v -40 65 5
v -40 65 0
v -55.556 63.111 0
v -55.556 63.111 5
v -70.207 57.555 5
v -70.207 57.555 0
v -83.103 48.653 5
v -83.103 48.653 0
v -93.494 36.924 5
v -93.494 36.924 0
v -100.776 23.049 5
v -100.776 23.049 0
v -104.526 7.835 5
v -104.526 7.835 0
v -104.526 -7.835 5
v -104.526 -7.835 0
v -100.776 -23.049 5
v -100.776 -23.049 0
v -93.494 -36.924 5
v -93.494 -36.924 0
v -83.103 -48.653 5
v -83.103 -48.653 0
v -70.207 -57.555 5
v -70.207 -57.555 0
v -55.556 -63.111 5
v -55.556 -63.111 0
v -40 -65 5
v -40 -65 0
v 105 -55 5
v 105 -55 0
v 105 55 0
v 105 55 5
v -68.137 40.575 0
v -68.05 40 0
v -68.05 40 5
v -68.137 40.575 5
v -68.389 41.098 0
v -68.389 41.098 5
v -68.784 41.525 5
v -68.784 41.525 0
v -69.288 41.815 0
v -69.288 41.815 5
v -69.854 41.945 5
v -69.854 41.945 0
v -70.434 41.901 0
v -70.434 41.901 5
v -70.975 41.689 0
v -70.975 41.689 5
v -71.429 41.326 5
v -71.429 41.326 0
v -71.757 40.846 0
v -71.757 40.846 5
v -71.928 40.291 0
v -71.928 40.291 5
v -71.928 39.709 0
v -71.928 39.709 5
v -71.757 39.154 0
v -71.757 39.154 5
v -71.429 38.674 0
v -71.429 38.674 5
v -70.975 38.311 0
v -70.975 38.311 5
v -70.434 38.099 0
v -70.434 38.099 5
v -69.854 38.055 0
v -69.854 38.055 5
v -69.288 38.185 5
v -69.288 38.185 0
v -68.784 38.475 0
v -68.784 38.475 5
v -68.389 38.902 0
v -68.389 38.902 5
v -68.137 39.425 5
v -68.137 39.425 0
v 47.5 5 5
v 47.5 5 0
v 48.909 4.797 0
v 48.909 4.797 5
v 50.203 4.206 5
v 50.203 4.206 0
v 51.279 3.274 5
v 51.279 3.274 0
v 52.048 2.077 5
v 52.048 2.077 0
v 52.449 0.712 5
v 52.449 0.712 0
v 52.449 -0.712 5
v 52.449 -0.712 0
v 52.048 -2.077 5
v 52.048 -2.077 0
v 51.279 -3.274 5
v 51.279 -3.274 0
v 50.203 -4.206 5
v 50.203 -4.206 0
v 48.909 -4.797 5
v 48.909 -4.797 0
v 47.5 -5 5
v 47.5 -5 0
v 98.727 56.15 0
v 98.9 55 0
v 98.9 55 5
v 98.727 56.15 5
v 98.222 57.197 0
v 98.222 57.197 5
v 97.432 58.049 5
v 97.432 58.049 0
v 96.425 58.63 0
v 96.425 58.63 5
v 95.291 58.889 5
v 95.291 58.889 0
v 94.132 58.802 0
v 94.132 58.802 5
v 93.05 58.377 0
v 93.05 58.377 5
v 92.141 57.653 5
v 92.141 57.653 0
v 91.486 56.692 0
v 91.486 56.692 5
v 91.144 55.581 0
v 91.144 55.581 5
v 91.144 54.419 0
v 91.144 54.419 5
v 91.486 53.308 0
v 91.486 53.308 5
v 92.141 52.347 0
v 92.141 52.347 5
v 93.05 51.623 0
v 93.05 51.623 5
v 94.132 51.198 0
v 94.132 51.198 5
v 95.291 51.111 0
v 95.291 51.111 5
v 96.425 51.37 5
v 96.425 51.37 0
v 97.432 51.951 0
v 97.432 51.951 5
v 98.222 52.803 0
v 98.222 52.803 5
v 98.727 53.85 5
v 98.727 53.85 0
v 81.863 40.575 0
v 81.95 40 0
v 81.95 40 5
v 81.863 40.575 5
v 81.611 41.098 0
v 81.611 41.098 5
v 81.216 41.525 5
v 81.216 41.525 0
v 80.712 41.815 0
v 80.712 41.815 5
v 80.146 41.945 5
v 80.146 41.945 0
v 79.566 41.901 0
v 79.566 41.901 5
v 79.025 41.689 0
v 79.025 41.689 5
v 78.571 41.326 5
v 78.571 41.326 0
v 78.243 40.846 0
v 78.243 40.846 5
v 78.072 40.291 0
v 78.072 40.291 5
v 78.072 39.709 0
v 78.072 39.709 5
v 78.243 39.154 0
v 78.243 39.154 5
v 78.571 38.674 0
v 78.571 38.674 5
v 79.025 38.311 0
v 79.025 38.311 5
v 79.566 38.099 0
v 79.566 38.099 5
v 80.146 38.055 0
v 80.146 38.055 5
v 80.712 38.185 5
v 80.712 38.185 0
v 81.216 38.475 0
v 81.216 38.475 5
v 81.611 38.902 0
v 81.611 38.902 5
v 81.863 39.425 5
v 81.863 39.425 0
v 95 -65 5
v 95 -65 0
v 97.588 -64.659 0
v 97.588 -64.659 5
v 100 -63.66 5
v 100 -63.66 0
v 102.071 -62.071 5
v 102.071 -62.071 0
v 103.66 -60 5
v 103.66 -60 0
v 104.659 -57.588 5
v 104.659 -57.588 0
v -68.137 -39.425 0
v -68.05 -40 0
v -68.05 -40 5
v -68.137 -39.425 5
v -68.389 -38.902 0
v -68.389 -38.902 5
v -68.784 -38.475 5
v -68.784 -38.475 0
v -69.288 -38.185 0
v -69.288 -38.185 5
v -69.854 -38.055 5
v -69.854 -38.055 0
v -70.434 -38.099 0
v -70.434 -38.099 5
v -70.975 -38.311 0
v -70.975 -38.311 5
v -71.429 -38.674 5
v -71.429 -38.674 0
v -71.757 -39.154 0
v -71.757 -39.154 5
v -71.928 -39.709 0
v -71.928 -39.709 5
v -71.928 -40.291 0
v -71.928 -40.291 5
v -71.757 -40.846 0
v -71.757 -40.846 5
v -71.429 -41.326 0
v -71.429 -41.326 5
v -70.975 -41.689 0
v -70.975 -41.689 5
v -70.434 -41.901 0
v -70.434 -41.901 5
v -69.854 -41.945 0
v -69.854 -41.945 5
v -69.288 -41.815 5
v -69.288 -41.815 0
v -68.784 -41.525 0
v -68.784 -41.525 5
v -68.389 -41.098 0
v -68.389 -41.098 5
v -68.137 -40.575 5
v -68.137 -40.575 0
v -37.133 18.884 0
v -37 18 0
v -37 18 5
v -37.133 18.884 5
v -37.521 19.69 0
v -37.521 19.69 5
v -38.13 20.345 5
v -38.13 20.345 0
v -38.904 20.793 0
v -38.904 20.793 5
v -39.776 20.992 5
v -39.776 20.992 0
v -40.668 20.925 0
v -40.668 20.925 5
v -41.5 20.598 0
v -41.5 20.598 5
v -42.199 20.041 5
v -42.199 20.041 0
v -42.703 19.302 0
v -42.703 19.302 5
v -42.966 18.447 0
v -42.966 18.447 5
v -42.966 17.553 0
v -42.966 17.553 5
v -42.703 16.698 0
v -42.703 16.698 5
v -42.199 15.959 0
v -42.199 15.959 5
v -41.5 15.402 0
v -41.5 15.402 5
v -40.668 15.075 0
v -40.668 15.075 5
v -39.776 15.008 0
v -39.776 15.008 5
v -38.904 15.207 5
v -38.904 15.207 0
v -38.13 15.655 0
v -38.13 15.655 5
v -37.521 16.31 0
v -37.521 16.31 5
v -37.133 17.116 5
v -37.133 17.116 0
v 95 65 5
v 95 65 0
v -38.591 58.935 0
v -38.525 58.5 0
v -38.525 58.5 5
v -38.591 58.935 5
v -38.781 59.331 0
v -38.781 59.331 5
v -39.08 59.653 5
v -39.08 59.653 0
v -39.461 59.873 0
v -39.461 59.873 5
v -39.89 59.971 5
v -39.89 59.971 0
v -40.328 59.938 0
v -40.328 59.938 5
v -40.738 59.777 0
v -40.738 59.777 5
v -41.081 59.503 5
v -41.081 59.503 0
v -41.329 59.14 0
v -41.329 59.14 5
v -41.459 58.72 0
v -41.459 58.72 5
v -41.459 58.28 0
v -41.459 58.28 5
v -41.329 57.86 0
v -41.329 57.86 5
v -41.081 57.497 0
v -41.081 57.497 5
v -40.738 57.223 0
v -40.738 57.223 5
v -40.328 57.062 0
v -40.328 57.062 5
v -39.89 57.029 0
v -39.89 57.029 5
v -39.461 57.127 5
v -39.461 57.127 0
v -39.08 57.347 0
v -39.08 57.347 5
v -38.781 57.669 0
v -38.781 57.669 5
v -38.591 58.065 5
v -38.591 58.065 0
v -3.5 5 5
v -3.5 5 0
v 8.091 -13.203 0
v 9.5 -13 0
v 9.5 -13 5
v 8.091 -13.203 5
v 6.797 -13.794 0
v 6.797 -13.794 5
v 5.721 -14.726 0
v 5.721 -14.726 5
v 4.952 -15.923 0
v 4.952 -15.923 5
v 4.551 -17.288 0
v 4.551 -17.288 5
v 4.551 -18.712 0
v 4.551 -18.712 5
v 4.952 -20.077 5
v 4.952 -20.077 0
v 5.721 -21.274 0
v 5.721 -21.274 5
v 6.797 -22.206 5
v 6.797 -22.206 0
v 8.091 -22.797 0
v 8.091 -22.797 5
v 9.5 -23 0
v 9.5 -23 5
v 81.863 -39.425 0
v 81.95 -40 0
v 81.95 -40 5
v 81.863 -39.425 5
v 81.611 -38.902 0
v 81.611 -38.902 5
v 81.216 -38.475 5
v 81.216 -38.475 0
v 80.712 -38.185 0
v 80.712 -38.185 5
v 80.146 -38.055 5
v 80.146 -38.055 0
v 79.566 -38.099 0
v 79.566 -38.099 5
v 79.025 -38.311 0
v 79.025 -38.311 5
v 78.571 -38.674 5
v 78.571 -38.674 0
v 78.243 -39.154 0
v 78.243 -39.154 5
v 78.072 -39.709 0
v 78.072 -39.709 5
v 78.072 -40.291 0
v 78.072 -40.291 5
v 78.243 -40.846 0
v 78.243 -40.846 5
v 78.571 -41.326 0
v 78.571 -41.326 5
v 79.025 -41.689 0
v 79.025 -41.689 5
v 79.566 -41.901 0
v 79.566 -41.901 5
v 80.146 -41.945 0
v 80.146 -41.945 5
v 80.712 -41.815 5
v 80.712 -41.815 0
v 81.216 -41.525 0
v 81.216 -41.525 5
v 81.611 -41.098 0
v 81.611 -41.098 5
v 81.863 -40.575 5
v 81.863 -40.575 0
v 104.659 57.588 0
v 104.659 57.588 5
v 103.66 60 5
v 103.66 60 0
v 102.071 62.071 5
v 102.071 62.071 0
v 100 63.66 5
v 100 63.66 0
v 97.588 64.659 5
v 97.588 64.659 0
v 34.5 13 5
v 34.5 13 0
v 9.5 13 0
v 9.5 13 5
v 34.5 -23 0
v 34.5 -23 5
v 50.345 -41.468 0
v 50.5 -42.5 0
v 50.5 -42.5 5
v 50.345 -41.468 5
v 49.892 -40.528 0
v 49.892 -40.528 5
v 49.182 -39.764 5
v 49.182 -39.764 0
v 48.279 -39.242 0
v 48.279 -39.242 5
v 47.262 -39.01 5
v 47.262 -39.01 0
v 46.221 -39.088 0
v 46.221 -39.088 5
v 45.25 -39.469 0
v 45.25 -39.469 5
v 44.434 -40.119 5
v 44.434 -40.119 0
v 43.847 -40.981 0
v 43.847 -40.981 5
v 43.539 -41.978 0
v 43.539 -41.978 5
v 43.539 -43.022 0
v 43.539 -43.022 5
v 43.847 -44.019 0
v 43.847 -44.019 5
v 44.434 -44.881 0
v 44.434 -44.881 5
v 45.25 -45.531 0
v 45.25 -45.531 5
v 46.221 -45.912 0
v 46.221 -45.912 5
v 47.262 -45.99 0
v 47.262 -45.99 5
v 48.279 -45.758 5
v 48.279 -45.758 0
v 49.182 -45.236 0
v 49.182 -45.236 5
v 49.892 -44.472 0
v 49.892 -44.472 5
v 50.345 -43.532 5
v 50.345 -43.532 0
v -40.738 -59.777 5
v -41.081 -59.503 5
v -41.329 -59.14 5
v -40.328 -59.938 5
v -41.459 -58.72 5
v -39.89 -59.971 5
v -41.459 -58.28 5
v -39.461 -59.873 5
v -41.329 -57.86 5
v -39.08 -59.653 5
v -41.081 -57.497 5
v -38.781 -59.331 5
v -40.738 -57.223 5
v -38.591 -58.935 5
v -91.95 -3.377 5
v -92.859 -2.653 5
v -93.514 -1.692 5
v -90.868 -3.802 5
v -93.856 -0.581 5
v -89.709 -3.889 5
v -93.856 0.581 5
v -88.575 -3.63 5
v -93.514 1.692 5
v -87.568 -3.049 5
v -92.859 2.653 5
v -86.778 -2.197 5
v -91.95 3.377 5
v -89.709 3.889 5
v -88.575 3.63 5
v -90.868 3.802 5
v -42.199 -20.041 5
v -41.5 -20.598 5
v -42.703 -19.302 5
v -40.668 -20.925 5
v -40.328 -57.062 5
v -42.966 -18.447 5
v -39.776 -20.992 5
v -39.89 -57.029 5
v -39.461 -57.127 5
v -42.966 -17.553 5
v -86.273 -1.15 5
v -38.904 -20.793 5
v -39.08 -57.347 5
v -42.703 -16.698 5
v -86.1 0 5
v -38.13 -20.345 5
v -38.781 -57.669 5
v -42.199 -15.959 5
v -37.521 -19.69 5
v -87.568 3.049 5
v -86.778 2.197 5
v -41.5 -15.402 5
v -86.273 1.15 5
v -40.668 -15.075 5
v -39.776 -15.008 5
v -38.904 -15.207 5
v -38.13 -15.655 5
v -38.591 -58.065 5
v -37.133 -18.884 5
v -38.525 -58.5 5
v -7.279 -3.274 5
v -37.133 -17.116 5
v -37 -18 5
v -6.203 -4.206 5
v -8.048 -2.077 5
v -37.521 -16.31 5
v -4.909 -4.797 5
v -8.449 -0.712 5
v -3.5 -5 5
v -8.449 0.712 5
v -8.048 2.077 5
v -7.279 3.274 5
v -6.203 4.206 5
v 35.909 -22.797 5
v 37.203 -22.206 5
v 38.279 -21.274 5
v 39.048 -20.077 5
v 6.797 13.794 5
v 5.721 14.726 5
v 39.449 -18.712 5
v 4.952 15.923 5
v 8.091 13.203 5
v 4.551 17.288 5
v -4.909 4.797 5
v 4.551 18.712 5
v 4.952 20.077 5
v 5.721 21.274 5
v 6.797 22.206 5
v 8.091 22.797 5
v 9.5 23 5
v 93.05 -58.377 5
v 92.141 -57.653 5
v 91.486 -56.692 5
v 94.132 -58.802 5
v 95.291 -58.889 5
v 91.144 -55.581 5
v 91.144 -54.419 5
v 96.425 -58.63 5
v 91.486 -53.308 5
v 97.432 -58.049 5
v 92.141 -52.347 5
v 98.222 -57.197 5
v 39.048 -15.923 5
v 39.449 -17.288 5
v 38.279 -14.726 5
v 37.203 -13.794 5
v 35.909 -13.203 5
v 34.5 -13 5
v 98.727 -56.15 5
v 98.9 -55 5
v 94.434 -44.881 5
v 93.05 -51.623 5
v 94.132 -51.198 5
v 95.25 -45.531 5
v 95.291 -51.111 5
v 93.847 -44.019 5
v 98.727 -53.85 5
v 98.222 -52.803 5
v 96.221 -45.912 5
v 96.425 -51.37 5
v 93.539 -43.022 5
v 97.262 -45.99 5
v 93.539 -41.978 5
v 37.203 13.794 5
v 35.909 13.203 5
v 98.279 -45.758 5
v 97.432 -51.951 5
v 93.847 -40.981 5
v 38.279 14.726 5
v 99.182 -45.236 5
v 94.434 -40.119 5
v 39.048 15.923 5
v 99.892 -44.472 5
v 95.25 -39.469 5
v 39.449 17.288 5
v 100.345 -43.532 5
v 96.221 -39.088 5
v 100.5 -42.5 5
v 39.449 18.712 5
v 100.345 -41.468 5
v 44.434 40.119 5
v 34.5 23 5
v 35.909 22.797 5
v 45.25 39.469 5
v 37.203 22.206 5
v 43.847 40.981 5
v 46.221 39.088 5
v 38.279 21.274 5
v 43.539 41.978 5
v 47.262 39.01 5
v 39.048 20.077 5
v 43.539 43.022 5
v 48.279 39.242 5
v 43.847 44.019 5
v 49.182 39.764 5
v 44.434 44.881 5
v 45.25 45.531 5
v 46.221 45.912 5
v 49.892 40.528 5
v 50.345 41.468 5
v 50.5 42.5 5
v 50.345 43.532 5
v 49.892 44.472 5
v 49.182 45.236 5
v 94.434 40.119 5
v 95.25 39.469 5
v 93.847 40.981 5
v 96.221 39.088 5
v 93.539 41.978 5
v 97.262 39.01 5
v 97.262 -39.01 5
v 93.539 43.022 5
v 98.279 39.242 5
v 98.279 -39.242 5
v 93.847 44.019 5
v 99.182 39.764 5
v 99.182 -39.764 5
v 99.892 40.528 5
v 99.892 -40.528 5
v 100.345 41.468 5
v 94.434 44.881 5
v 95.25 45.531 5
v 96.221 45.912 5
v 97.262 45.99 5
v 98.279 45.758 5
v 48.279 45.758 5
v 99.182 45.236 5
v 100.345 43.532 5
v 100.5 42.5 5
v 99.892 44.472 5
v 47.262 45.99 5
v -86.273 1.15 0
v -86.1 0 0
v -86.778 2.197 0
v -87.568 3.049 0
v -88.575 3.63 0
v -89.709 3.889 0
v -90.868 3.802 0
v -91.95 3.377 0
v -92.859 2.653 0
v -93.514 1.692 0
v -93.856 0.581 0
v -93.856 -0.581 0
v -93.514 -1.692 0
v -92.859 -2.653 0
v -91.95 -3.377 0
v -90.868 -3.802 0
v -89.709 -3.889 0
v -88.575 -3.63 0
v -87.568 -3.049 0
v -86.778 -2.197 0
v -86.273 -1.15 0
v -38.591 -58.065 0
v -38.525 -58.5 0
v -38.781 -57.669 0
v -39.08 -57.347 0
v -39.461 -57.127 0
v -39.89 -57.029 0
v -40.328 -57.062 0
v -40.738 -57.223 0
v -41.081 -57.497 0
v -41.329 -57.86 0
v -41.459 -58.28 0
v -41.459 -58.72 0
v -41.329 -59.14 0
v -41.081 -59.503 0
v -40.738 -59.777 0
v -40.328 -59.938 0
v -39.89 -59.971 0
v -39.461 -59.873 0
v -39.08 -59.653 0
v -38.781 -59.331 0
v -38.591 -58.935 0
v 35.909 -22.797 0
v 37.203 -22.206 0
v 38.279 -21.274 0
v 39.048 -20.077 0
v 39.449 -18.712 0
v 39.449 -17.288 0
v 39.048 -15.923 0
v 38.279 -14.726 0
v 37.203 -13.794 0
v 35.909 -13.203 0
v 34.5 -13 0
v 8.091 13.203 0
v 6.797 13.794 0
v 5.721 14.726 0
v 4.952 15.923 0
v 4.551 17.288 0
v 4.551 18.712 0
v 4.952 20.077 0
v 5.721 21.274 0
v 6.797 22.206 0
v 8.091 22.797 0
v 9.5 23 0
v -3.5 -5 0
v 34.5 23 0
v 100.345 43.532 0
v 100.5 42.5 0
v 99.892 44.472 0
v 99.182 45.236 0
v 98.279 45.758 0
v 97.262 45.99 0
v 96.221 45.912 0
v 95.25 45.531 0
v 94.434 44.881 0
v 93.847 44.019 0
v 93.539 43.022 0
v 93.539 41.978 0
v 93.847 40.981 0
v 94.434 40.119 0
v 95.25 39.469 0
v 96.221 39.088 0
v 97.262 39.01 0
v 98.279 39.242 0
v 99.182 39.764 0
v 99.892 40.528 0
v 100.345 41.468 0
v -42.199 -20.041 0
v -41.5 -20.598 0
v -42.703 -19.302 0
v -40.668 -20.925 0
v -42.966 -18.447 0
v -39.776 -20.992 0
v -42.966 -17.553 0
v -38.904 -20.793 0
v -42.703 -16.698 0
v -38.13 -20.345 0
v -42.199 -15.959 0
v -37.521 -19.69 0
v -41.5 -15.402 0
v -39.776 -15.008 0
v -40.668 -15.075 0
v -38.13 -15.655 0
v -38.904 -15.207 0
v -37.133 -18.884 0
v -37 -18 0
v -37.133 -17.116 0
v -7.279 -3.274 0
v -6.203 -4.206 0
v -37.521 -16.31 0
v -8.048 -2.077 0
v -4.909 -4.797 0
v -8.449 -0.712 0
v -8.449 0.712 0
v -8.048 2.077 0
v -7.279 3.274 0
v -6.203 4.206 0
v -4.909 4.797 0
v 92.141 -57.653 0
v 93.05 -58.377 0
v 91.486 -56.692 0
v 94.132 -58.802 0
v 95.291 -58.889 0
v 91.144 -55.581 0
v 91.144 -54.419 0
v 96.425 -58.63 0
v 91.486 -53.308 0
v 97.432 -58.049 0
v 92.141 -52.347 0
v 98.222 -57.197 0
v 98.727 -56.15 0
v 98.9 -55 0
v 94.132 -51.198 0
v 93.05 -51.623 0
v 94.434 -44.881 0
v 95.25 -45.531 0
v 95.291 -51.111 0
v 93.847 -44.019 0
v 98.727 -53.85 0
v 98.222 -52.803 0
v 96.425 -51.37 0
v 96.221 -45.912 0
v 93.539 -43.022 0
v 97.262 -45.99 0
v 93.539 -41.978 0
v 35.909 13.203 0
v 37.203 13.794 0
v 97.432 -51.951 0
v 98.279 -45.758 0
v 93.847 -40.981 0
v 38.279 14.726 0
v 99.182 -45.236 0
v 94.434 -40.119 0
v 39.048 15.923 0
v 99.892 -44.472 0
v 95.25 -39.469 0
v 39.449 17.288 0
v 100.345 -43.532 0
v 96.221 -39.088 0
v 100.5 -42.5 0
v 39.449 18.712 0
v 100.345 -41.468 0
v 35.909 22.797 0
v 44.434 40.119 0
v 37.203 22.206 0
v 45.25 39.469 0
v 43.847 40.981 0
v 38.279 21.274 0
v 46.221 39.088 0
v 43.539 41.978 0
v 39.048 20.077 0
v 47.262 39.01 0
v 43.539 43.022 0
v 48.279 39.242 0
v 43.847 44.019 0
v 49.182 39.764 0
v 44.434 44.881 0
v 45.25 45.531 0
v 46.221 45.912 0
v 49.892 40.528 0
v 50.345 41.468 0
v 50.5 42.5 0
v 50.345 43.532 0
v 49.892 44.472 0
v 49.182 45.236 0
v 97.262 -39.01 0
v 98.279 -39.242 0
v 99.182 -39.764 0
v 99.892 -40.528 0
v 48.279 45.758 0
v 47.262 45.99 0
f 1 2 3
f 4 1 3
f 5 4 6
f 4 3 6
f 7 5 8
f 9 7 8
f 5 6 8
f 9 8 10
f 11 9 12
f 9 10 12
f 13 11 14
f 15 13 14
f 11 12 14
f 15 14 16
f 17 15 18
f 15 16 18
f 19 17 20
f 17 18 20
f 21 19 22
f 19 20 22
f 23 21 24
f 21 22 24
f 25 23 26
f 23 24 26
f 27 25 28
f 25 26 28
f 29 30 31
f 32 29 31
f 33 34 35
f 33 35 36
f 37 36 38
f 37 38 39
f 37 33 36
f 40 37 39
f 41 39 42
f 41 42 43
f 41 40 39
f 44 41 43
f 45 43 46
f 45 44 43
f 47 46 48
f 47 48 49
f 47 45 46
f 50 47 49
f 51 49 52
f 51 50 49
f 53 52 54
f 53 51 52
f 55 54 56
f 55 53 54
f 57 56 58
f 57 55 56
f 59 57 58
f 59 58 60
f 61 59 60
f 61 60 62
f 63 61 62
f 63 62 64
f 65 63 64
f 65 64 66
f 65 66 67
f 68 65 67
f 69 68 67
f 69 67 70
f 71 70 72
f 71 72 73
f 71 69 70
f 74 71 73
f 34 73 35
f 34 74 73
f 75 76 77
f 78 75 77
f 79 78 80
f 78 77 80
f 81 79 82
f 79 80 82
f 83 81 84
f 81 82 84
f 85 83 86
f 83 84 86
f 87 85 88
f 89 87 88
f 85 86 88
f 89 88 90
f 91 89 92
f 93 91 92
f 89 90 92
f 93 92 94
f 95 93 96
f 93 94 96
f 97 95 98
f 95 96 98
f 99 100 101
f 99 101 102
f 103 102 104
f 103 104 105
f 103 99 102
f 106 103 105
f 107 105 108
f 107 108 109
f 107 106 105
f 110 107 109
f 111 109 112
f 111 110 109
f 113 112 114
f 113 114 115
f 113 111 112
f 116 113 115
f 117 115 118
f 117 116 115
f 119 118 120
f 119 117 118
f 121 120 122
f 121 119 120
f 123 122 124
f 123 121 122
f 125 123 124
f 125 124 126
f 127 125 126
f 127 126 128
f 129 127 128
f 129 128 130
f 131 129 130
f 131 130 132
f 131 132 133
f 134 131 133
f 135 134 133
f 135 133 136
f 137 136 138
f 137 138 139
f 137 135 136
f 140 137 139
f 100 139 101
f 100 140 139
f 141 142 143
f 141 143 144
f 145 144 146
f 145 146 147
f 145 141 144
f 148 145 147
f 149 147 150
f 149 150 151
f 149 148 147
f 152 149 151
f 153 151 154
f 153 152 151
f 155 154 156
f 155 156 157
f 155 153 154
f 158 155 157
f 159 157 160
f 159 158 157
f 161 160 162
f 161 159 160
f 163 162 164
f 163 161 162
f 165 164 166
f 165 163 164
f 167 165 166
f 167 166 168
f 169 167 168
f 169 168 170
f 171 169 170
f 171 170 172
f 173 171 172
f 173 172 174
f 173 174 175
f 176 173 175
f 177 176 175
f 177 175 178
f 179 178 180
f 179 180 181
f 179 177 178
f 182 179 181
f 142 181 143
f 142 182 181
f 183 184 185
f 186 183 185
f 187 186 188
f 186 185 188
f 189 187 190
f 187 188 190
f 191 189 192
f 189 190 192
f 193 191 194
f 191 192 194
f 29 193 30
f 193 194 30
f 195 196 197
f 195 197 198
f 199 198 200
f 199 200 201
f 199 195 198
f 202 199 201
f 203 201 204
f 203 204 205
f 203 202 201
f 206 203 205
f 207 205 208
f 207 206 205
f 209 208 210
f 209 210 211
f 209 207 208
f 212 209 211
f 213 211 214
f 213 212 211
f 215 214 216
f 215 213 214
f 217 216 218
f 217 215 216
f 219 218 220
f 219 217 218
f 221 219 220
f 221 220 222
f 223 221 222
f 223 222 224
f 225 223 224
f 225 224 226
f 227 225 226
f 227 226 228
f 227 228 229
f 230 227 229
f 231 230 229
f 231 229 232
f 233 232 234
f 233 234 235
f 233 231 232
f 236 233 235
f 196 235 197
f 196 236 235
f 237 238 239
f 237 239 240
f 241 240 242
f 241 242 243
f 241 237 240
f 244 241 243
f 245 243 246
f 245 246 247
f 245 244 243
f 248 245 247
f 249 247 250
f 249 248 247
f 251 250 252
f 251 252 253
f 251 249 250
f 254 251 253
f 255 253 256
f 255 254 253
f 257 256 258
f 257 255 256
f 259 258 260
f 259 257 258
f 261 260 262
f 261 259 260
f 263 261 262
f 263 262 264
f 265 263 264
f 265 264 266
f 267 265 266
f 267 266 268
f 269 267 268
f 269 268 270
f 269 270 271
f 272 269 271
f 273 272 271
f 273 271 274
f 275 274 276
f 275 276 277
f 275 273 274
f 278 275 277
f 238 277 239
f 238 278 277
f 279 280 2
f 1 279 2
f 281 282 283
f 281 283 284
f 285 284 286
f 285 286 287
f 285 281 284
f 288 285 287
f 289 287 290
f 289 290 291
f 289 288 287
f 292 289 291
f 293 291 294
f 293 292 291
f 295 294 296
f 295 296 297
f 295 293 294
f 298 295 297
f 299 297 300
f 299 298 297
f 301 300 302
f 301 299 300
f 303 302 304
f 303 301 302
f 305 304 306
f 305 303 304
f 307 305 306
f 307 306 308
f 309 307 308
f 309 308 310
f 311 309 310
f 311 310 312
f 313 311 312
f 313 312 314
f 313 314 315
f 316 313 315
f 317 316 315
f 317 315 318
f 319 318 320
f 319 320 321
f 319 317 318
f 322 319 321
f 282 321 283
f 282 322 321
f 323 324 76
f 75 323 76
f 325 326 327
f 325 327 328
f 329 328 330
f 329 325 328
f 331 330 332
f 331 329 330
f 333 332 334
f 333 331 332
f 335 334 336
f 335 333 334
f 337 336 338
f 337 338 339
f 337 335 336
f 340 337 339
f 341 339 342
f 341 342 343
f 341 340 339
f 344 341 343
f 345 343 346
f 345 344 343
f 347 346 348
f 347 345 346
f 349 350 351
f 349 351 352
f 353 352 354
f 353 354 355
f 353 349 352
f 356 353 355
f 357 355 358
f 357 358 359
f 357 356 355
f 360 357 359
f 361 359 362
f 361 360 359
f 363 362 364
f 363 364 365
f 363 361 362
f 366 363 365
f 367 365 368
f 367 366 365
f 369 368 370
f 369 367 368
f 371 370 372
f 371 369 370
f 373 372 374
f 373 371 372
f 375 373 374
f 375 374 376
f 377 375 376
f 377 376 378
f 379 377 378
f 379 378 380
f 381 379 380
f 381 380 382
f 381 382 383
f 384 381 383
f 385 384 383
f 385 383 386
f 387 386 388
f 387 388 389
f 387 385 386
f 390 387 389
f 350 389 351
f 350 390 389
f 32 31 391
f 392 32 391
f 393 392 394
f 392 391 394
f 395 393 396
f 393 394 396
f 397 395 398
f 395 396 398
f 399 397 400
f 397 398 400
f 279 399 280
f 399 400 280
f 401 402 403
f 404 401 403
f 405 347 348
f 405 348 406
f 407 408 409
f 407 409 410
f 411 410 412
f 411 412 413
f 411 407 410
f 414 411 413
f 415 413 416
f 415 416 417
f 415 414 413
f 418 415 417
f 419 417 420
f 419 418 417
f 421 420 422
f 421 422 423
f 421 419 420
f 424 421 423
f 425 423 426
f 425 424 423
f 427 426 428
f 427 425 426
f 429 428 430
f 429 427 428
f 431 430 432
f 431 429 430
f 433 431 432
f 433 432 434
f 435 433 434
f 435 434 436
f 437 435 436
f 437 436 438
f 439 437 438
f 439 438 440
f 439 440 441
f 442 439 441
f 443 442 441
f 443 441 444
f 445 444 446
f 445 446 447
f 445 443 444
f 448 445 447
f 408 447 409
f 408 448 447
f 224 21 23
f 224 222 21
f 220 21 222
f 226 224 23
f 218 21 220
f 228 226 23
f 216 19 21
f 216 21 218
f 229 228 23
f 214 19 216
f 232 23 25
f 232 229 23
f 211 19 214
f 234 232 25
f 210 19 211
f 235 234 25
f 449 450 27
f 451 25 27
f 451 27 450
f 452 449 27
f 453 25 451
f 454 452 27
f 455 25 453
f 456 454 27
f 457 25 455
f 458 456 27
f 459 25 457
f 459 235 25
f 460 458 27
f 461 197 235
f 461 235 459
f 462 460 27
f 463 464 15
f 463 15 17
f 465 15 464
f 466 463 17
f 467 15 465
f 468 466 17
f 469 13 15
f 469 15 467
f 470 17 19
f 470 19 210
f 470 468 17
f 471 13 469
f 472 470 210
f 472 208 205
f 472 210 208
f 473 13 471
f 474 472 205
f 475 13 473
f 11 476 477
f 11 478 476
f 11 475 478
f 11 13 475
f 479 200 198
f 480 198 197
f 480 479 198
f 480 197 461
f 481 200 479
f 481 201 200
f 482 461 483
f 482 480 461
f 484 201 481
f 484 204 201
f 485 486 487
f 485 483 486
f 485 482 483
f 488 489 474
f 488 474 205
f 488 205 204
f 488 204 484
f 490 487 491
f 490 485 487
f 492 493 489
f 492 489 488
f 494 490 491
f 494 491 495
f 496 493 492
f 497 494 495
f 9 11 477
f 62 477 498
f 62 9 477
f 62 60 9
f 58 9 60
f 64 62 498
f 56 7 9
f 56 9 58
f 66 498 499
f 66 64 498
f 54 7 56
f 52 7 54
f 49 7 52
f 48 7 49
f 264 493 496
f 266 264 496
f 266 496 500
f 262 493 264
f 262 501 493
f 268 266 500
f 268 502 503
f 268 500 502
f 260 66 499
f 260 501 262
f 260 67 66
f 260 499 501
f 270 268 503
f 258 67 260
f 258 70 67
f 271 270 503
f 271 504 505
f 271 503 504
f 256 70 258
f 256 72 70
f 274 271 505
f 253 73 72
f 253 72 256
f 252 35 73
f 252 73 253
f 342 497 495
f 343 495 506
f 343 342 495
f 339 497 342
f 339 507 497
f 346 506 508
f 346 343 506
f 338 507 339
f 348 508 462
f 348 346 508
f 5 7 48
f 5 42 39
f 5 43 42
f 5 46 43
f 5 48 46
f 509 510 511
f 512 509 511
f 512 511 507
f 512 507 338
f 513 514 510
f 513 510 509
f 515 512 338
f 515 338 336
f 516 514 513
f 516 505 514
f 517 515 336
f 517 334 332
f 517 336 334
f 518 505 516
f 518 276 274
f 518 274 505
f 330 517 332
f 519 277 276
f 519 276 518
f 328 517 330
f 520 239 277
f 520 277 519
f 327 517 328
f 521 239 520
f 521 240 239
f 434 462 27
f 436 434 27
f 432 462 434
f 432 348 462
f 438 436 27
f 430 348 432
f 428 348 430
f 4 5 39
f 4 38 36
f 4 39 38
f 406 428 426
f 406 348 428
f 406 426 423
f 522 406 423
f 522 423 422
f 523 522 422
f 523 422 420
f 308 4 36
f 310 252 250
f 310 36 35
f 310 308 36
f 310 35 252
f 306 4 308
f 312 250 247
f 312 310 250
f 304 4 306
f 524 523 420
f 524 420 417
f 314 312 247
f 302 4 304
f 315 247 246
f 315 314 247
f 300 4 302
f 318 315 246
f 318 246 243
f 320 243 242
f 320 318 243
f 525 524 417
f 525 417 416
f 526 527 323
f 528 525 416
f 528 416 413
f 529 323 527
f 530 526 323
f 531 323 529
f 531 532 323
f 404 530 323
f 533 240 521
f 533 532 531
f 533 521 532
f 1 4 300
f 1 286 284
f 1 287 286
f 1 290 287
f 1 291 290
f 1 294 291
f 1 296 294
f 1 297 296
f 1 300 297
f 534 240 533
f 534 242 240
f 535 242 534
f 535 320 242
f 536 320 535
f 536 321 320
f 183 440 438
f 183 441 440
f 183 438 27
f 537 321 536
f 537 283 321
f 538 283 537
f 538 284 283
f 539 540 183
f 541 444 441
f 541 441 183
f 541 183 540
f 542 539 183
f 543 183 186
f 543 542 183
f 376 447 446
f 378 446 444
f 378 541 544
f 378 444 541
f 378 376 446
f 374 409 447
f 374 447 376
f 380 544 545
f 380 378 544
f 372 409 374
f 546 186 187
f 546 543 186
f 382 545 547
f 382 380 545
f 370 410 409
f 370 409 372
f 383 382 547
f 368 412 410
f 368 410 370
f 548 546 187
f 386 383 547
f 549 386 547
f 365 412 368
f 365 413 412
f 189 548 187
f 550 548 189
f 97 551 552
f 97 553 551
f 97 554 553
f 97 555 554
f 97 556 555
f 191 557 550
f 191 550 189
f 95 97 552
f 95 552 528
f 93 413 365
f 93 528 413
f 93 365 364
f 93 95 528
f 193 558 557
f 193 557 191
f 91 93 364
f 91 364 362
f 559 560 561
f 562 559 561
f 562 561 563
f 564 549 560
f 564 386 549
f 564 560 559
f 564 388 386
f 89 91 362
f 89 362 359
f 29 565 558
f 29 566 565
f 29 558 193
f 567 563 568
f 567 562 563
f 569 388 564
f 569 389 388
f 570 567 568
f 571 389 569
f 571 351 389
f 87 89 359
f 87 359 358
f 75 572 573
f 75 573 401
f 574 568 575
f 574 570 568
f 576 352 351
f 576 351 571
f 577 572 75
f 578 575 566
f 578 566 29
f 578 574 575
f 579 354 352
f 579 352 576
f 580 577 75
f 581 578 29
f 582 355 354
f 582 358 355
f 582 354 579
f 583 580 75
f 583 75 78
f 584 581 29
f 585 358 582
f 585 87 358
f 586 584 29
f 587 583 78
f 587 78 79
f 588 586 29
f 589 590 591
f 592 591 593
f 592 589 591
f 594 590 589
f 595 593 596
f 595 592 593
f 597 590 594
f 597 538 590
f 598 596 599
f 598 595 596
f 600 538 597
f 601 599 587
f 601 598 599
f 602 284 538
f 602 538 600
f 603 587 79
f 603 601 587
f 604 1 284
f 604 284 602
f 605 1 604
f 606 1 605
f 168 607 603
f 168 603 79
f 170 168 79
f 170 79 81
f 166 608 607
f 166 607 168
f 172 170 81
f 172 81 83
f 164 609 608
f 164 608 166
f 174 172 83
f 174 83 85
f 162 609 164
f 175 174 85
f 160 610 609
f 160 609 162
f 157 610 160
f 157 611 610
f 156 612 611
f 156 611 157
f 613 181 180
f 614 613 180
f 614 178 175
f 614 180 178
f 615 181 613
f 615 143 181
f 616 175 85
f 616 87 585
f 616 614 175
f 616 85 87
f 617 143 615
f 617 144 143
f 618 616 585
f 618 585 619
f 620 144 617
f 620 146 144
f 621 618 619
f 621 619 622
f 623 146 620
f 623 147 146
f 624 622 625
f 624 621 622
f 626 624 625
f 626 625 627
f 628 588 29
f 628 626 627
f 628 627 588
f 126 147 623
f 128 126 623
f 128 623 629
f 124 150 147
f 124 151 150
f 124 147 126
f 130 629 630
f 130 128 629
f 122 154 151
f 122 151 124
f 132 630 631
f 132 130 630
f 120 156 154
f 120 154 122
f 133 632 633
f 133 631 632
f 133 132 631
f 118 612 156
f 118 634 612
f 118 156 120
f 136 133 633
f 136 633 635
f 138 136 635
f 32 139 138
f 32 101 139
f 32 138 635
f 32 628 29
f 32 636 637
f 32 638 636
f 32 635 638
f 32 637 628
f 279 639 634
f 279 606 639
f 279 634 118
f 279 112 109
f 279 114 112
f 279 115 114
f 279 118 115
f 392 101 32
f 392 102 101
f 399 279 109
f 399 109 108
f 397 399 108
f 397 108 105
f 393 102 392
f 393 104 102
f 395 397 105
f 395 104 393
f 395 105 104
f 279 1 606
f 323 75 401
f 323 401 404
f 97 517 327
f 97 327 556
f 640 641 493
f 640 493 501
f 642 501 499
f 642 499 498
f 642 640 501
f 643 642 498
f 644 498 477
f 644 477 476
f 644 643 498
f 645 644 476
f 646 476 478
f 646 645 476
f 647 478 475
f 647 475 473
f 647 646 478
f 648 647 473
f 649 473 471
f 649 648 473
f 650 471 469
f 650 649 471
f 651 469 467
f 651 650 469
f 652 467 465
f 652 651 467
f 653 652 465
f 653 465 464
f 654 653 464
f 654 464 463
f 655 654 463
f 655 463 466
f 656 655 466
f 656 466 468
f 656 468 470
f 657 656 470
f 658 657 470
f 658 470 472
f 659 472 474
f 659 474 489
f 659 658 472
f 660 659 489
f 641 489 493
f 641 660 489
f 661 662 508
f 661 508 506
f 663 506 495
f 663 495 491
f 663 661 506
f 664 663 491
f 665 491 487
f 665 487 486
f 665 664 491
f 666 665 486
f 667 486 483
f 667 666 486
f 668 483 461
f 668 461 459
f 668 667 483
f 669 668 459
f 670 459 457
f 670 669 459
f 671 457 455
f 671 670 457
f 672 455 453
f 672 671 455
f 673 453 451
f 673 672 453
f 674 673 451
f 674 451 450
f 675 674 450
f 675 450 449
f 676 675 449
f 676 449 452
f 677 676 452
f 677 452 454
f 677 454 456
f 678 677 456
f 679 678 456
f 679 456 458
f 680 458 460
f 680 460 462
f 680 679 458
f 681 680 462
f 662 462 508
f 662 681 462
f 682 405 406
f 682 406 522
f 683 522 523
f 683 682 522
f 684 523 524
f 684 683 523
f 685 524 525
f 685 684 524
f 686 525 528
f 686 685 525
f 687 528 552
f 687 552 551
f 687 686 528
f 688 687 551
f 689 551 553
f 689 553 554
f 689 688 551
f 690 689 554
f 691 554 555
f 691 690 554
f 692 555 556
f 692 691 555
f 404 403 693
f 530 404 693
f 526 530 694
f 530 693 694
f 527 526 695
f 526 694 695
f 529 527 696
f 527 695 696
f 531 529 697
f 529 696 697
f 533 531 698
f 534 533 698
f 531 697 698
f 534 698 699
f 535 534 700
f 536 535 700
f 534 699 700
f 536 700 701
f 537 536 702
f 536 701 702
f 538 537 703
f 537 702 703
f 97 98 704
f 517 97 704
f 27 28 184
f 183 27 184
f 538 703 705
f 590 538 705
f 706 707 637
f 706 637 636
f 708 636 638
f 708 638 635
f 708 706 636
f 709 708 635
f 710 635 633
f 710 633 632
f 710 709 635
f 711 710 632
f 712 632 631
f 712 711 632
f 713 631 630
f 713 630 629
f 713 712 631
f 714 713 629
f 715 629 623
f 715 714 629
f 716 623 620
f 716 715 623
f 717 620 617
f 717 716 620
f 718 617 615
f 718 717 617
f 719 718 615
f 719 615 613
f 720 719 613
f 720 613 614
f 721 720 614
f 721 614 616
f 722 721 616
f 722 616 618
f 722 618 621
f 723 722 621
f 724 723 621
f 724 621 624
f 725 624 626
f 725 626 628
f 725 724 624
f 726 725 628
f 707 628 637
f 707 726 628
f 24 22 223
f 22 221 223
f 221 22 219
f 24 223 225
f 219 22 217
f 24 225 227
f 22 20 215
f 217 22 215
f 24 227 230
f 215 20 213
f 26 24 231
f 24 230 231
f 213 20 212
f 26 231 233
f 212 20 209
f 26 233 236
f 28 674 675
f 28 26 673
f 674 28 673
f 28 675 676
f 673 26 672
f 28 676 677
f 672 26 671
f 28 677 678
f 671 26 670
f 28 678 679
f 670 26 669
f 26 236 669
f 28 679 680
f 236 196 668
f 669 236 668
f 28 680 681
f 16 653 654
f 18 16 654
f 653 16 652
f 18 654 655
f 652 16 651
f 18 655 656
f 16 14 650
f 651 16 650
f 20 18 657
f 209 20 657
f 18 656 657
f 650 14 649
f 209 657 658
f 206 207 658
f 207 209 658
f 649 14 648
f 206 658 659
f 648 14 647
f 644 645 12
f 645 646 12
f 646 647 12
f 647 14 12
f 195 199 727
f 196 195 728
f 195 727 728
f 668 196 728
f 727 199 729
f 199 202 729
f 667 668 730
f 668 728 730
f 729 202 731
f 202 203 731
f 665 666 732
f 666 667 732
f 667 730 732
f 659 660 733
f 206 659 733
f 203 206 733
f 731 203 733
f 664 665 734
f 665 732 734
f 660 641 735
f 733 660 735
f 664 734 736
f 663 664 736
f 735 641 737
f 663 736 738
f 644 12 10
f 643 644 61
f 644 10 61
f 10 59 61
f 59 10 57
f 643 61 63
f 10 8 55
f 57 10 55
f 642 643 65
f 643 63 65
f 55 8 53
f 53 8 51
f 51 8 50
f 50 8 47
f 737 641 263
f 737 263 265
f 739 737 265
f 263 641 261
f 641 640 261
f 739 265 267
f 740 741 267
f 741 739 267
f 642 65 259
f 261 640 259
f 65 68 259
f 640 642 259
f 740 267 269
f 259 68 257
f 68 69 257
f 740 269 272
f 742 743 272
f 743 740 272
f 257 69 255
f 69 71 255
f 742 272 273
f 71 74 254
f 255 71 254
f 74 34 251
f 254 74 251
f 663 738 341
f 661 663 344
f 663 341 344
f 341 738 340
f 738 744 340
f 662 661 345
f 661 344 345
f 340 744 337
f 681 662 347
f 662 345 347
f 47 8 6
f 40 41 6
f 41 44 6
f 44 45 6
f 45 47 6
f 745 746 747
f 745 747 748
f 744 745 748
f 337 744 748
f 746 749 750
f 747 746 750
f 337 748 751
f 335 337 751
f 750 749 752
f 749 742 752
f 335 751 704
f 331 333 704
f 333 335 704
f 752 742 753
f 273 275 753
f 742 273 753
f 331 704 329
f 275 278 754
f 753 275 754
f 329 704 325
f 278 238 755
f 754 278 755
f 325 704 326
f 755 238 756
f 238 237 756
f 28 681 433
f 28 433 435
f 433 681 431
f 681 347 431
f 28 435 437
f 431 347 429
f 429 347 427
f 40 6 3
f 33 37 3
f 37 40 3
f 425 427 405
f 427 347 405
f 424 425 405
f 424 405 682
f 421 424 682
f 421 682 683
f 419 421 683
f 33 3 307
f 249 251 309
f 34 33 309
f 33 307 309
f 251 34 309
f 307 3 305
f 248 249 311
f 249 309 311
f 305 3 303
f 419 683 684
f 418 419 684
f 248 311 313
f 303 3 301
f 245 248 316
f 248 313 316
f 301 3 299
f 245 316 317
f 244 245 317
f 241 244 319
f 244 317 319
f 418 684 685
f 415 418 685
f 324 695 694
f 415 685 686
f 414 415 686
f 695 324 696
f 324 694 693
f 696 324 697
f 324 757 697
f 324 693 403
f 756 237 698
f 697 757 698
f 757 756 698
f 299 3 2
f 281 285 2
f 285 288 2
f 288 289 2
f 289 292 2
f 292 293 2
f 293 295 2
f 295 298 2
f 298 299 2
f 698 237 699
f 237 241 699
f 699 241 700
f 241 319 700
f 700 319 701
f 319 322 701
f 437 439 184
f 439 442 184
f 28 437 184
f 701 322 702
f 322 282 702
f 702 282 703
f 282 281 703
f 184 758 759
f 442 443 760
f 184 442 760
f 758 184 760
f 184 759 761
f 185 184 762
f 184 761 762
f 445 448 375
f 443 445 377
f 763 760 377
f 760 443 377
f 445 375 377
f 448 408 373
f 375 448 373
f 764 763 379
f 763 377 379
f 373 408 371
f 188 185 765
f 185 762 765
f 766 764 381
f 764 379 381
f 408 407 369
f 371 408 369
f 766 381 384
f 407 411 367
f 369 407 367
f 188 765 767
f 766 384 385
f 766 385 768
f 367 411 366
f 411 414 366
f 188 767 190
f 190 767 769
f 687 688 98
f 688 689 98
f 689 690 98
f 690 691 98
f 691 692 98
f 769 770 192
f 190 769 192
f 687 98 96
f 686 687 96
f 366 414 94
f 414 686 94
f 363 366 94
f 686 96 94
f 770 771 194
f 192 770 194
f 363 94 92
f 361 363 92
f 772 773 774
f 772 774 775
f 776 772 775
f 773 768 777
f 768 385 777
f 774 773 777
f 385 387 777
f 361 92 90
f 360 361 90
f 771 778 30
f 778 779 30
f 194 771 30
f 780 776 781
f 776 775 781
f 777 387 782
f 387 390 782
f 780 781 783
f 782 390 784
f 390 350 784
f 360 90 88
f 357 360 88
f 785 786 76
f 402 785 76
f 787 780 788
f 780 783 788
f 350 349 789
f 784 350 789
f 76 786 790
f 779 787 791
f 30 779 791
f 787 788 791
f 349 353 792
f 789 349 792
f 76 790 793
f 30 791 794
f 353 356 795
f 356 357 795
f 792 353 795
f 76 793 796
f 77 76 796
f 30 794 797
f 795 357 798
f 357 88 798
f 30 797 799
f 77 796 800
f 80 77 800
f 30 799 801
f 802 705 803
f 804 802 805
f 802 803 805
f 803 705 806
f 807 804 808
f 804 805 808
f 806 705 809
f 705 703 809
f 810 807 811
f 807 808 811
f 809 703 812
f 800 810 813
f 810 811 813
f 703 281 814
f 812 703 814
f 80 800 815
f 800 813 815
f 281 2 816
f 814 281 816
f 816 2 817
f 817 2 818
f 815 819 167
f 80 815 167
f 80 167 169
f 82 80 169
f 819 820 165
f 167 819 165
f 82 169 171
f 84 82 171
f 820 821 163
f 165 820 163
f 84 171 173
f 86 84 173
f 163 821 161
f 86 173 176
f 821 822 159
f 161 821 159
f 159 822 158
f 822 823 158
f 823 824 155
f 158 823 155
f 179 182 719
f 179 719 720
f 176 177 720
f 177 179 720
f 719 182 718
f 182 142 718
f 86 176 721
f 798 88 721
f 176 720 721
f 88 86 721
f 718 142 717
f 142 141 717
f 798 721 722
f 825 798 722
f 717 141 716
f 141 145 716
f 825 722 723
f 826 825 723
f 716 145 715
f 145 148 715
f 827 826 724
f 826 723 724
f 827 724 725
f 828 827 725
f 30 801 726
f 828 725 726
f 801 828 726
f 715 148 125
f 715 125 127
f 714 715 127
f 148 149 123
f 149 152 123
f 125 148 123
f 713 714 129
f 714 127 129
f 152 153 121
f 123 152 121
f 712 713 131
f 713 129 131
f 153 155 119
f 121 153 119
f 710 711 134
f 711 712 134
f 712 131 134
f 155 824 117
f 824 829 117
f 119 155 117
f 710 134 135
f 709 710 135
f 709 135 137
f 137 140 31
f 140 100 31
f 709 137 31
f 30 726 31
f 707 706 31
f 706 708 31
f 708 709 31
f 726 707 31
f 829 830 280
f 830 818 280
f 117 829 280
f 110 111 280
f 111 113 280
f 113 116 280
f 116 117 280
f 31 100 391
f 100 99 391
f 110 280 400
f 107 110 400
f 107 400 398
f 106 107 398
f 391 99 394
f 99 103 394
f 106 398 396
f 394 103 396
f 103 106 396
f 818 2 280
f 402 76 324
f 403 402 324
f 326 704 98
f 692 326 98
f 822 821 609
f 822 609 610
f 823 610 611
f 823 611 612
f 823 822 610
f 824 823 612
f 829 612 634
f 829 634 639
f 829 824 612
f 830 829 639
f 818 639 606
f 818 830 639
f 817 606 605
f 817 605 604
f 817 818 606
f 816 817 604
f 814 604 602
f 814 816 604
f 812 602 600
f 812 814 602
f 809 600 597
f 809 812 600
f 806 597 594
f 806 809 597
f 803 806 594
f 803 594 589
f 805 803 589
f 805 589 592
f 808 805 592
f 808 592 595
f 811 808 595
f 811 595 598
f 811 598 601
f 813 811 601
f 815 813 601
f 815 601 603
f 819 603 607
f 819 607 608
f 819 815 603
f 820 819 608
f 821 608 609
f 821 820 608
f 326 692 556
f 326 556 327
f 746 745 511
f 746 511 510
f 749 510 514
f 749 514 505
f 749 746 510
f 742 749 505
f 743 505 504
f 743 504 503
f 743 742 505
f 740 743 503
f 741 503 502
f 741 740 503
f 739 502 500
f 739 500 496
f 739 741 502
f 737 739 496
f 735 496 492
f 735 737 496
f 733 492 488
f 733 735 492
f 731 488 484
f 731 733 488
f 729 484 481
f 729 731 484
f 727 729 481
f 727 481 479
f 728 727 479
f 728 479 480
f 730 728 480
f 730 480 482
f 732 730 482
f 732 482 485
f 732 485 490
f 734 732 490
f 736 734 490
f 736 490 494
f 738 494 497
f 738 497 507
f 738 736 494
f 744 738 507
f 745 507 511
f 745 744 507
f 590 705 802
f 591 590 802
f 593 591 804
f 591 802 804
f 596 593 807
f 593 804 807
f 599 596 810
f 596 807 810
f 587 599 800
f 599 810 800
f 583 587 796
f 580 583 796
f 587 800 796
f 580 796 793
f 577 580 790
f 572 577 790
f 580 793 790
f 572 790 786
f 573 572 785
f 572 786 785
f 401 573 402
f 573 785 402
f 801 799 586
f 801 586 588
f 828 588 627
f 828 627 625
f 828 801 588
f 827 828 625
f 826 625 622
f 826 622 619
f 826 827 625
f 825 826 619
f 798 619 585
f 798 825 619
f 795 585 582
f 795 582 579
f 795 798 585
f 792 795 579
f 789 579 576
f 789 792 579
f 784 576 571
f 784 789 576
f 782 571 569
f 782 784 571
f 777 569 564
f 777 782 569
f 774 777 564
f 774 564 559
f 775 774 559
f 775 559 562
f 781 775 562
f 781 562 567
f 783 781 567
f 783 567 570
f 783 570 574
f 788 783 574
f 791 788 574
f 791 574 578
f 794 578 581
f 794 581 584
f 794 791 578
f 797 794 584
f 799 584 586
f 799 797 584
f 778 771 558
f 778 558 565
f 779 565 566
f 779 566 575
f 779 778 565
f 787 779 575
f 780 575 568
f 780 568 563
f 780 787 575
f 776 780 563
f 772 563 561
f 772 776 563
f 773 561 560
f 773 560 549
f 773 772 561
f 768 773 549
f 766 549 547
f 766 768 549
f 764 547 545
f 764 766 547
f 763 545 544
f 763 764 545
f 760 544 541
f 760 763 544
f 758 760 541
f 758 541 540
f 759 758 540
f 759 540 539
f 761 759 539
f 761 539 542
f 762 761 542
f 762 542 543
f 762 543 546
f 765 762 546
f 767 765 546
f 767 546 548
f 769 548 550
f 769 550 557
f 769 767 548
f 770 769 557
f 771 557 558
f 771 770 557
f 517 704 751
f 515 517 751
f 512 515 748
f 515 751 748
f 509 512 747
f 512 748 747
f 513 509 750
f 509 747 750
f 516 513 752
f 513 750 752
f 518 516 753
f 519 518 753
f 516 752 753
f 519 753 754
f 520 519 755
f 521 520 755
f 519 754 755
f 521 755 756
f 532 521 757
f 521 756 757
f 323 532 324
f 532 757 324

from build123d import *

# Parameters (mm, degrees)
SKETCH1_R           = 3.9
SKETCH1_R_2         = 3
SKETCH1_R_3         = 1.95
SKETCH1_R_4         = 3.5
SKETCH1_R_5         = 1.475
BOSS_EXTRUDE2_DEPTH = 5


with BuildPart() as part:
    # Sketch1 → Boss-Extrude2 (new body)
    with BuildSketch(Plane.XY):
        with BuildLine():
            Line((-40, -65), (95, -65))
            ThreePointArc((95, -65), (102.071067812, -62.071067812), (105, -55))
            Line((105, -55), (105, 55))
            ThreePointArc((105, 55), (102.071067812, 62.071067812), (95, 65))
            Line((95, 65), (-40, 65))
            ThreePointArc((-40, 65), (-105, 0), (-40, -65))
        make_face()
        with Locations((95, 55)):
            Circle(SKETCH1_R, mode=Mode.SUBTRACT)
        with Locations((95, -55)):
            Circle(SKETCH1_R, mode=Mode.SUBTRACT)
        with Locations((-90, 0)):
            Circle(SKETCH1_R, mode=Mode.SUBTRACT)
        with Locations((-40, -18)):
            Circle(SKETCH1_R_2, mode=Mode.SUBTRACT)
        with Locations((-40, 18)):
            Circle(SKETCH1_R_2, mode=Mode.SUBTRACT)
        with Locations((80, 40)):
            Circle(SKETCH1_R_3, mode=Mode.SUBTRACT)
        with Locations((80, -40)):
            Circle(SKETCH1_R_3, mode=Mode.SUBTRACT)
        with Locations((-70, 40)):
            Circle(SKETCH1_R_3, mode=Mode.SUBTRACT)
        with Locations((-70, -40)):
            Circle(SKETCH1_R_3, mode=Mode.SUBTRACT)
        with Locations((47, 42.5)):
            Circle(SKETCH1_R_4, mode=Mode.SUBTRACT)
        with Locations((97, 42.5)):
            Circle(SKETCH1_R_4, mode=Mode.SUBTRACT)
        with Locations((97, -42.5)):
            Circle(SKETCH1_R_4, mode=Mode.SUBTRACT)
        with Locations((47, -42.5)):
            Circle(SKETCH1_R_4, mode=Mode.SUBTRACT)
        with Locations((-40, 58.5)):
            Circle(SKETCH1_R_5, mode=Mode.SUBTRACT)
        with Locations((-40, -58.5)):
            Circle(SKETCH1_R_5, mode=Mode.SUBTRACT)
        with BuildLine():
            Line((-3.5, 5), (47.5, 5))
            ThreePointArc((47.5, 5), (52.5, 0), (47.5, -5))
            Line((47.5, -5), (-3.5, -5))
            ThreePointArc((-3.5, -5), (-8.5, 0), (-3.5, 5))
        make_face(mode=Mode.SUBTRACT)
        with BuildLine():
            Line((9.5, 23), (34.5, 23))
            ThreePointArc((34.5, 23), (39.5, 18), (34.5, 13))
            Line((34.5, 13), (9.5, 13))
            ThreePointArc((9.5, 13), (4.5, 18), (9.5, 23))
        make_face(mode=Mode.SUBTRACT)
        with BuildLine():
            Line((9.5, -23), (34.5, -23))
            ThreePointArc((34.5, -23), (39.5, -18), (34.5, -13))
            Line((34.5, -13), (9.5, -13))
            ThreePointArc((9.5, -13), (4.5, -18), (9.5, -23))
        make_face(mode=Mode.SUBTRACT)
    extrude(amount=BOSS_EXTRUDE2_DEPTH)


solid = part.part
